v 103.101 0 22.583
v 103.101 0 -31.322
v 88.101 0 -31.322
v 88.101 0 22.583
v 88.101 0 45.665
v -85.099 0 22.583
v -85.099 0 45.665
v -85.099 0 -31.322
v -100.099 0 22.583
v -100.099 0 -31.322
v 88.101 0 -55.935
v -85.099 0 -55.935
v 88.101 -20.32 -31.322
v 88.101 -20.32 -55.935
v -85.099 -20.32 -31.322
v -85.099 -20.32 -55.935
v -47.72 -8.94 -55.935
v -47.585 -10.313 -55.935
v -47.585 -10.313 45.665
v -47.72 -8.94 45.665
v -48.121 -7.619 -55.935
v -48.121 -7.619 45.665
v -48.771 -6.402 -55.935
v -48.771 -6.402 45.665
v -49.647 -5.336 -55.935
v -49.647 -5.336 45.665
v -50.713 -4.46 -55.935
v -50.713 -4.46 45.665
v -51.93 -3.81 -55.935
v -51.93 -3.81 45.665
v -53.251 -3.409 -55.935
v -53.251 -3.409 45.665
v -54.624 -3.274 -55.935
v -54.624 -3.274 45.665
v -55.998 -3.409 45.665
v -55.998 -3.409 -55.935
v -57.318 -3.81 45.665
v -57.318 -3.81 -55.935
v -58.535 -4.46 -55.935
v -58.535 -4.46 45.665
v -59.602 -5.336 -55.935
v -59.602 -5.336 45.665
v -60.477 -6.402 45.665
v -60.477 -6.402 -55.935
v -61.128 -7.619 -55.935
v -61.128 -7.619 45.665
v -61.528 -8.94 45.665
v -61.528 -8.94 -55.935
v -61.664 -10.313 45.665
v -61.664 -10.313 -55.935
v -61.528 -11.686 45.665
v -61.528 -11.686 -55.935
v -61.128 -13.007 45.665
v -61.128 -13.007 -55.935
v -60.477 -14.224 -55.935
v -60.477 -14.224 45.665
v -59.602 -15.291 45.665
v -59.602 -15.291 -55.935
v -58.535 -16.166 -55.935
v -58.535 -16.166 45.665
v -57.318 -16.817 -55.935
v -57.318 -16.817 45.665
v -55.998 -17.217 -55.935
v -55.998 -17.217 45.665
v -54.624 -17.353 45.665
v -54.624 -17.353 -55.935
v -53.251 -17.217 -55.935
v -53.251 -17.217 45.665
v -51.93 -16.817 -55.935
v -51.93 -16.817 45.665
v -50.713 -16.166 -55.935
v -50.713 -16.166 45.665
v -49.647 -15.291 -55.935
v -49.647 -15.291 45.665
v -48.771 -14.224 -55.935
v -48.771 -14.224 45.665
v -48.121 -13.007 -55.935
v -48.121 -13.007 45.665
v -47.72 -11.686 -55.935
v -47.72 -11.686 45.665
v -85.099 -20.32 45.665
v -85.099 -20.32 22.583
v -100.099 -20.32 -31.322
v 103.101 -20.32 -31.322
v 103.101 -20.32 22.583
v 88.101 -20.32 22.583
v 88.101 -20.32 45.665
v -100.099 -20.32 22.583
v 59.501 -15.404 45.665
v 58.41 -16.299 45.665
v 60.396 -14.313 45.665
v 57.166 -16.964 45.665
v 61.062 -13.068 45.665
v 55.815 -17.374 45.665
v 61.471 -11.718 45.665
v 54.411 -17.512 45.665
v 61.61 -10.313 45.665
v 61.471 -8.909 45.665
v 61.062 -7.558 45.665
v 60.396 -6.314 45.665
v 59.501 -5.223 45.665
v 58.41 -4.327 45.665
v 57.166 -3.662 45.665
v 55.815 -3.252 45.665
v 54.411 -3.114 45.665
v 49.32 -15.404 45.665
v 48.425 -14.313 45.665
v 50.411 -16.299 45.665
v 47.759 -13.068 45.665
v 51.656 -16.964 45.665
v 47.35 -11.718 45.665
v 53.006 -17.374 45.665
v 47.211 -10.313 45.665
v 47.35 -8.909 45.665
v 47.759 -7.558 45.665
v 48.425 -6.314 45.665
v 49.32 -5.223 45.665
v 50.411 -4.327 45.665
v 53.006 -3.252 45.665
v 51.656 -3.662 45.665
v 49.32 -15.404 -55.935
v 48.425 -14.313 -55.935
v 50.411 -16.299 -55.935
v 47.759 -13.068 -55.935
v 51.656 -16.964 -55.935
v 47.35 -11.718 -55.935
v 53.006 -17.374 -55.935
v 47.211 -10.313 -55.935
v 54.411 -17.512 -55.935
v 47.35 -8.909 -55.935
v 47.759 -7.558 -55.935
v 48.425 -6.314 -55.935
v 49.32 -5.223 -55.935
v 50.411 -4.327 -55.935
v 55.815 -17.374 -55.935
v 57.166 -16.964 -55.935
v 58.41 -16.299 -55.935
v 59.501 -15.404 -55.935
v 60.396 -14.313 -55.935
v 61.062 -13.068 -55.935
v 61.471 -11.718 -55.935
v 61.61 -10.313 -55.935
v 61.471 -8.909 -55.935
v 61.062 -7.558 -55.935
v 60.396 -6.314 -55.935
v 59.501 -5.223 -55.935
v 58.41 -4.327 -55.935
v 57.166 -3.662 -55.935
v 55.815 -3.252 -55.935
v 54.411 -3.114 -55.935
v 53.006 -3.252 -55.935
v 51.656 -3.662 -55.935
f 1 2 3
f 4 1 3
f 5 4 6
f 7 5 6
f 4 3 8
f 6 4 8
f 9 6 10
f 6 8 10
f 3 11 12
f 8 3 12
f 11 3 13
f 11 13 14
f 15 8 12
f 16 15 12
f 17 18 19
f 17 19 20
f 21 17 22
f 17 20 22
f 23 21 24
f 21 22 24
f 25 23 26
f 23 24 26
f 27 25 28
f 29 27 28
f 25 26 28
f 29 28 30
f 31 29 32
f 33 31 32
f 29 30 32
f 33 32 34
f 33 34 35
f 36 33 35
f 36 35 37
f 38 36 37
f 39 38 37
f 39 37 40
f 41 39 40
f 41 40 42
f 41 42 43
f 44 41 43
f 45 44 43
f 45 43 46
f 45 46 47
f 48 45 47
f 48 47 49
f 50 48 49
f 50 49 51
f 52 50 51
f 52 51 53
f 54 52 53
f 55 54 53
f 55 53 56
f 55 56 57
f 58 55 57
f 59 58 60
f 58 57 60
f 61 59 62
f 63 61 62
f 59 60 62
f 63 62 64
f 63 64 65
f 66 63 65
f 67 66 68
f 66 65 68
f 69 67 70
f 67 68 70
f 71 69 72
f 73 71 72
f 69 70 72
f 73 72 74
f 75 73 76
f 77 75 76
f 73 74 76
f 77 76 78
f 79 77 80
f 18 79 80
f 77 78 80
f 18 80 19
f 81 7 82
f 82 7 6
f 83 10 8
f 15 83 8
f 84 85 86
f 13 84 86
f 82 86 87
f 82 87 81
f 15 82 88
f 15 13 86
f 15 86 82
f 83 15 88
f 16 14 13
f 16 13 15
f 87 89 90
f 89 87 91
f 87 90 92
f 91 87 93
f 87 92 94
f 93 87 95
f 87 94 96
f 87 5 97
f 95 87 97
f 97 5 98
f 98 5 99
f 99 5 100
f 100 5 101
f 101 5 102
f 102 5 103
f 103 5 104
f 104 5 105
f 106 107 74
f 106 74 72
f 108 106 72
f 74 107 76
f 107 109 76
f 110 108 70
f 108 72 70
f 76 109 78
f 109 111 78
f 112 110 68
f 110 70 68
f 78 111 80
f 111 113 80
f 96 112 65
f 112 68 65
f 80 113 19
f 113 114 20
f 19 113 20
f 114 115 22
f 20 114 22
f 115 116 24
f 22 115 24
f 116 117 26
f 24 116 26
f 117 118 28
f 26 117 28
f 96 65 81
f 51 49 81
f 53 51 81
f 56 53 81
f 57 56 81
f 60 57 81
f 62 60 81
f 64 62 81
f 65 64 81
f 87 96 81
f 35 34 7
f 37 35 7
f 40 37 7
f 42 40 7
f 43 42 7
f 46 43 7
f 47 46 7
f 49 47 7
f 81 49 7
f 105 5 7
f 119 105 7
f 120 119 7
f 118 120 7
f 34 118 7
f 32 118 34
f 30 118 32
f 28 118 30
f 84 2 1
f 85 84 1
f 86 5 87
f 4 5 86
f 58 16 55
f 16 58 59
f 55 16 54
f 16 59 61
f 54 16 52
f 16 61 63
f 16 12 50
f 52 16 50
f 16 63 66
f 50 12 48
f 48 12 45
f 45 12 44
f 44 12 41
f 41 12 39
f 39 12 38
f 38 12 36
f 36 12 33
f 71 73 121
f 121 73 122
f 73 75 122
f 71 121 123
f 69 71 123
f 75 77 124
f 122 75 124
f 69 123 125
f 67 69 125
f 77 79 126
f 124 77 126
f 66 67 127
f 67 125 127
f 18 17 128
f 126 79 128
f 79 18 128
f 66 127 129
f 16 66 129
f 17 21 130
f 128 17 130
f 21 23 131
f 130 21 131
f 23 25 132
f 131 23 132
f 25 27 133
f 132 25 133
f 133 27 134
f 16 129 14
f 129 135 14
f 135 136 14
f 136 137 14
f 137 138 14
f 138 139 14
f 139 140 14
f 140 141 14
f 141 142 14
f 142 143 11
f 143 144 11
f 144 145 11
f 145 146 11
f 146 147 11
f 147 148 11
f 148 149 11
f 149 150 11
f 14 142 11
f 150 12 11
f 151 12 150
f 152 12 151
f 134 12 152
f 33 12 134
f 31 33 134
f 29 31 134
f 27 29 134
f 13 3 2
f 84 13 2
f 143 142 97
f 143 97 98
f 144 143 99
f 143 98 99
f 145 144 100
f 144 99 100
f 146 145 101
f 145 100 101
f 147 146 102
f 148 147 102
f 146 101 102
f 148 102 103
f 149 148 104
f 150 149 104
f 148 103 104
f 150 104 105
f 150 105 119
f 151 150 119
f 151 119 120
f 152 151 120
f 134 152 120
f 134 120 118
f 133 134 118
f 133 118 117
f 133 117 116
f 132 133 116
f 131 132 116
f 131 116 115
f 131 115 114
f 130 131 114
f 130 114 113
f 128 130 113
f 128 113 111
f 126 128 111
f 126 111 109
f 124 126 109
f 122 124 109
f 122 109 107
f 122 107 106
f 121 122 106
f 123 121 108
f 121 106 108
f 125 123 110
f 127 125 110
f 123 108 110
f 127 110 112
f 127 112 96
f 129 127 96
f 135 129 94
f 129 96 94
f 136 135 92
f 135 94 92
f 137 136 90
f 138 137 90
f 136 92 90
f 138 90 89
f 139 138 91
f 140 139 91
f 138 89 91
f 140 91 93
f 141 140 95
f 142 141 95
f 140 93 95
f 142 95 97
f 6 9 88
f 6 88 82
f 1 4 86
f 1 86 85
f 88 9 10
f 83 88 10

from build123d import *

# Parameters (mm, degrees)
BOSS_EXTRUDE1_DEPTH = 20.32
SKETCH3_W           = 23.583471357
SKETCH3_H           = 24.613240303
SKETCH3_H_2         = 23.081850847
SKETCH3_W_2         = 25.880555541
CUT_EXTRUDE1_DEPTH  = 120.044088604
SKETCH4_R           = 7.199159396
CUT_EXTRUDE2_DEPTH  = 147.168727436
SKETCH5_R           = 7.199159396
SKETCH5_R_2         = 7.039396065
CUT_EXTRUDE4_DEPTH  = 147.168727436


with BuildPart() as part:
    # Sketch2 → Boss-Extrude1 (new body)
    with BuildSketch(Plane(origin=(0, 0, 0), x_dir=(1, 0, 0), z_dir=(0, 1, 0))):
        with BuildLine():
            Line((-85.098911353, 55.935303266), (88.101088647, 55.935303266))
            ThreePointArc((88.101088647, 55.935303266), (98.707690365, 51.541904984), (103.101088647, 40.935303266))
            Line((103.101088647, 40.935303266), (103.101088647, -30.664696734))
            ThreePointArc((103.101088647, -30.664696734), (98.707690365, -41.271298452), (88.101088647, -45.664696734))
            Line((88.101088647, -45.664696734), (-85.098911353, -45.664696734))
            ThreePointArc((-85.098911353, -45.664696734), (-95.705513071, -41.271298452), (-100.098911353, -30.664696734))
            Line((-100.098911353, -30.664696734), (-100.098911353, 40.935303266))
            ThreePointArc((-100.098911353, 40.935303266), (-95.705513071, 51.541904984), (-85.098911353, 55.935303266))
        make_face()
    extrude(amount=-BOSS_EXTRUDE1_DEPTH)

    # Sketch3 → Cut-Extrude1 (cut, through all)
    with BuildSketch(Plane(origin=(0, 0, 0), x_dir=(1, 0, 0), z_dir=(0, 1, 0))):
        with Locations((99.892824326, 43.628683115)):
            Rectangle(SKETCH3_W, SKETCH3_H)
        with Locations((99.892824326, -34.123771311)):
            Rectangle(SKETCH3_W, SKETCH3_H_2)
        with Locations((-98.039189124, 43.628683115)):
            Rectangle(SKETCH3_W_2, SKETCH3_H)
        with Locations((-98.039189124, -34.123771311)):
            Rectangle(SKETCH3_W_2, SKETCH3_H_2)
    extrude(amount=-CUT_EXTRUDE1_DEPTH, mode=Mode.SUBTRACT)

    # Sketch4 → Cut-Extrude2 (cut, through all)
    with BuildSketch(Plane.XY.offset(45.664696734)):
        with Locations((54.410594351, -10.313138946)):
            Circle(SKETCH4_R)
    extrude(amount=-CUT_EXTRUDE2_DEPTH, mode=Mode.SUBTRACT)

    # Sketch5 → Cut-Extrude4 (cut, through all)
    with BuildSketch(Plane.XY.offset(45.664696734)):
        with Locations((54.410594351, -10.313138946)):
            Circle(SKETCH5_R)
        with Locations((-54.624334914, -10.313138946)):
            Circle(SKETCH5_R_2)
    extrude(amount=-CUT_EXTRUDE4_DEPTH, mode=Mode.SUBTRACT)


solid = part.part
